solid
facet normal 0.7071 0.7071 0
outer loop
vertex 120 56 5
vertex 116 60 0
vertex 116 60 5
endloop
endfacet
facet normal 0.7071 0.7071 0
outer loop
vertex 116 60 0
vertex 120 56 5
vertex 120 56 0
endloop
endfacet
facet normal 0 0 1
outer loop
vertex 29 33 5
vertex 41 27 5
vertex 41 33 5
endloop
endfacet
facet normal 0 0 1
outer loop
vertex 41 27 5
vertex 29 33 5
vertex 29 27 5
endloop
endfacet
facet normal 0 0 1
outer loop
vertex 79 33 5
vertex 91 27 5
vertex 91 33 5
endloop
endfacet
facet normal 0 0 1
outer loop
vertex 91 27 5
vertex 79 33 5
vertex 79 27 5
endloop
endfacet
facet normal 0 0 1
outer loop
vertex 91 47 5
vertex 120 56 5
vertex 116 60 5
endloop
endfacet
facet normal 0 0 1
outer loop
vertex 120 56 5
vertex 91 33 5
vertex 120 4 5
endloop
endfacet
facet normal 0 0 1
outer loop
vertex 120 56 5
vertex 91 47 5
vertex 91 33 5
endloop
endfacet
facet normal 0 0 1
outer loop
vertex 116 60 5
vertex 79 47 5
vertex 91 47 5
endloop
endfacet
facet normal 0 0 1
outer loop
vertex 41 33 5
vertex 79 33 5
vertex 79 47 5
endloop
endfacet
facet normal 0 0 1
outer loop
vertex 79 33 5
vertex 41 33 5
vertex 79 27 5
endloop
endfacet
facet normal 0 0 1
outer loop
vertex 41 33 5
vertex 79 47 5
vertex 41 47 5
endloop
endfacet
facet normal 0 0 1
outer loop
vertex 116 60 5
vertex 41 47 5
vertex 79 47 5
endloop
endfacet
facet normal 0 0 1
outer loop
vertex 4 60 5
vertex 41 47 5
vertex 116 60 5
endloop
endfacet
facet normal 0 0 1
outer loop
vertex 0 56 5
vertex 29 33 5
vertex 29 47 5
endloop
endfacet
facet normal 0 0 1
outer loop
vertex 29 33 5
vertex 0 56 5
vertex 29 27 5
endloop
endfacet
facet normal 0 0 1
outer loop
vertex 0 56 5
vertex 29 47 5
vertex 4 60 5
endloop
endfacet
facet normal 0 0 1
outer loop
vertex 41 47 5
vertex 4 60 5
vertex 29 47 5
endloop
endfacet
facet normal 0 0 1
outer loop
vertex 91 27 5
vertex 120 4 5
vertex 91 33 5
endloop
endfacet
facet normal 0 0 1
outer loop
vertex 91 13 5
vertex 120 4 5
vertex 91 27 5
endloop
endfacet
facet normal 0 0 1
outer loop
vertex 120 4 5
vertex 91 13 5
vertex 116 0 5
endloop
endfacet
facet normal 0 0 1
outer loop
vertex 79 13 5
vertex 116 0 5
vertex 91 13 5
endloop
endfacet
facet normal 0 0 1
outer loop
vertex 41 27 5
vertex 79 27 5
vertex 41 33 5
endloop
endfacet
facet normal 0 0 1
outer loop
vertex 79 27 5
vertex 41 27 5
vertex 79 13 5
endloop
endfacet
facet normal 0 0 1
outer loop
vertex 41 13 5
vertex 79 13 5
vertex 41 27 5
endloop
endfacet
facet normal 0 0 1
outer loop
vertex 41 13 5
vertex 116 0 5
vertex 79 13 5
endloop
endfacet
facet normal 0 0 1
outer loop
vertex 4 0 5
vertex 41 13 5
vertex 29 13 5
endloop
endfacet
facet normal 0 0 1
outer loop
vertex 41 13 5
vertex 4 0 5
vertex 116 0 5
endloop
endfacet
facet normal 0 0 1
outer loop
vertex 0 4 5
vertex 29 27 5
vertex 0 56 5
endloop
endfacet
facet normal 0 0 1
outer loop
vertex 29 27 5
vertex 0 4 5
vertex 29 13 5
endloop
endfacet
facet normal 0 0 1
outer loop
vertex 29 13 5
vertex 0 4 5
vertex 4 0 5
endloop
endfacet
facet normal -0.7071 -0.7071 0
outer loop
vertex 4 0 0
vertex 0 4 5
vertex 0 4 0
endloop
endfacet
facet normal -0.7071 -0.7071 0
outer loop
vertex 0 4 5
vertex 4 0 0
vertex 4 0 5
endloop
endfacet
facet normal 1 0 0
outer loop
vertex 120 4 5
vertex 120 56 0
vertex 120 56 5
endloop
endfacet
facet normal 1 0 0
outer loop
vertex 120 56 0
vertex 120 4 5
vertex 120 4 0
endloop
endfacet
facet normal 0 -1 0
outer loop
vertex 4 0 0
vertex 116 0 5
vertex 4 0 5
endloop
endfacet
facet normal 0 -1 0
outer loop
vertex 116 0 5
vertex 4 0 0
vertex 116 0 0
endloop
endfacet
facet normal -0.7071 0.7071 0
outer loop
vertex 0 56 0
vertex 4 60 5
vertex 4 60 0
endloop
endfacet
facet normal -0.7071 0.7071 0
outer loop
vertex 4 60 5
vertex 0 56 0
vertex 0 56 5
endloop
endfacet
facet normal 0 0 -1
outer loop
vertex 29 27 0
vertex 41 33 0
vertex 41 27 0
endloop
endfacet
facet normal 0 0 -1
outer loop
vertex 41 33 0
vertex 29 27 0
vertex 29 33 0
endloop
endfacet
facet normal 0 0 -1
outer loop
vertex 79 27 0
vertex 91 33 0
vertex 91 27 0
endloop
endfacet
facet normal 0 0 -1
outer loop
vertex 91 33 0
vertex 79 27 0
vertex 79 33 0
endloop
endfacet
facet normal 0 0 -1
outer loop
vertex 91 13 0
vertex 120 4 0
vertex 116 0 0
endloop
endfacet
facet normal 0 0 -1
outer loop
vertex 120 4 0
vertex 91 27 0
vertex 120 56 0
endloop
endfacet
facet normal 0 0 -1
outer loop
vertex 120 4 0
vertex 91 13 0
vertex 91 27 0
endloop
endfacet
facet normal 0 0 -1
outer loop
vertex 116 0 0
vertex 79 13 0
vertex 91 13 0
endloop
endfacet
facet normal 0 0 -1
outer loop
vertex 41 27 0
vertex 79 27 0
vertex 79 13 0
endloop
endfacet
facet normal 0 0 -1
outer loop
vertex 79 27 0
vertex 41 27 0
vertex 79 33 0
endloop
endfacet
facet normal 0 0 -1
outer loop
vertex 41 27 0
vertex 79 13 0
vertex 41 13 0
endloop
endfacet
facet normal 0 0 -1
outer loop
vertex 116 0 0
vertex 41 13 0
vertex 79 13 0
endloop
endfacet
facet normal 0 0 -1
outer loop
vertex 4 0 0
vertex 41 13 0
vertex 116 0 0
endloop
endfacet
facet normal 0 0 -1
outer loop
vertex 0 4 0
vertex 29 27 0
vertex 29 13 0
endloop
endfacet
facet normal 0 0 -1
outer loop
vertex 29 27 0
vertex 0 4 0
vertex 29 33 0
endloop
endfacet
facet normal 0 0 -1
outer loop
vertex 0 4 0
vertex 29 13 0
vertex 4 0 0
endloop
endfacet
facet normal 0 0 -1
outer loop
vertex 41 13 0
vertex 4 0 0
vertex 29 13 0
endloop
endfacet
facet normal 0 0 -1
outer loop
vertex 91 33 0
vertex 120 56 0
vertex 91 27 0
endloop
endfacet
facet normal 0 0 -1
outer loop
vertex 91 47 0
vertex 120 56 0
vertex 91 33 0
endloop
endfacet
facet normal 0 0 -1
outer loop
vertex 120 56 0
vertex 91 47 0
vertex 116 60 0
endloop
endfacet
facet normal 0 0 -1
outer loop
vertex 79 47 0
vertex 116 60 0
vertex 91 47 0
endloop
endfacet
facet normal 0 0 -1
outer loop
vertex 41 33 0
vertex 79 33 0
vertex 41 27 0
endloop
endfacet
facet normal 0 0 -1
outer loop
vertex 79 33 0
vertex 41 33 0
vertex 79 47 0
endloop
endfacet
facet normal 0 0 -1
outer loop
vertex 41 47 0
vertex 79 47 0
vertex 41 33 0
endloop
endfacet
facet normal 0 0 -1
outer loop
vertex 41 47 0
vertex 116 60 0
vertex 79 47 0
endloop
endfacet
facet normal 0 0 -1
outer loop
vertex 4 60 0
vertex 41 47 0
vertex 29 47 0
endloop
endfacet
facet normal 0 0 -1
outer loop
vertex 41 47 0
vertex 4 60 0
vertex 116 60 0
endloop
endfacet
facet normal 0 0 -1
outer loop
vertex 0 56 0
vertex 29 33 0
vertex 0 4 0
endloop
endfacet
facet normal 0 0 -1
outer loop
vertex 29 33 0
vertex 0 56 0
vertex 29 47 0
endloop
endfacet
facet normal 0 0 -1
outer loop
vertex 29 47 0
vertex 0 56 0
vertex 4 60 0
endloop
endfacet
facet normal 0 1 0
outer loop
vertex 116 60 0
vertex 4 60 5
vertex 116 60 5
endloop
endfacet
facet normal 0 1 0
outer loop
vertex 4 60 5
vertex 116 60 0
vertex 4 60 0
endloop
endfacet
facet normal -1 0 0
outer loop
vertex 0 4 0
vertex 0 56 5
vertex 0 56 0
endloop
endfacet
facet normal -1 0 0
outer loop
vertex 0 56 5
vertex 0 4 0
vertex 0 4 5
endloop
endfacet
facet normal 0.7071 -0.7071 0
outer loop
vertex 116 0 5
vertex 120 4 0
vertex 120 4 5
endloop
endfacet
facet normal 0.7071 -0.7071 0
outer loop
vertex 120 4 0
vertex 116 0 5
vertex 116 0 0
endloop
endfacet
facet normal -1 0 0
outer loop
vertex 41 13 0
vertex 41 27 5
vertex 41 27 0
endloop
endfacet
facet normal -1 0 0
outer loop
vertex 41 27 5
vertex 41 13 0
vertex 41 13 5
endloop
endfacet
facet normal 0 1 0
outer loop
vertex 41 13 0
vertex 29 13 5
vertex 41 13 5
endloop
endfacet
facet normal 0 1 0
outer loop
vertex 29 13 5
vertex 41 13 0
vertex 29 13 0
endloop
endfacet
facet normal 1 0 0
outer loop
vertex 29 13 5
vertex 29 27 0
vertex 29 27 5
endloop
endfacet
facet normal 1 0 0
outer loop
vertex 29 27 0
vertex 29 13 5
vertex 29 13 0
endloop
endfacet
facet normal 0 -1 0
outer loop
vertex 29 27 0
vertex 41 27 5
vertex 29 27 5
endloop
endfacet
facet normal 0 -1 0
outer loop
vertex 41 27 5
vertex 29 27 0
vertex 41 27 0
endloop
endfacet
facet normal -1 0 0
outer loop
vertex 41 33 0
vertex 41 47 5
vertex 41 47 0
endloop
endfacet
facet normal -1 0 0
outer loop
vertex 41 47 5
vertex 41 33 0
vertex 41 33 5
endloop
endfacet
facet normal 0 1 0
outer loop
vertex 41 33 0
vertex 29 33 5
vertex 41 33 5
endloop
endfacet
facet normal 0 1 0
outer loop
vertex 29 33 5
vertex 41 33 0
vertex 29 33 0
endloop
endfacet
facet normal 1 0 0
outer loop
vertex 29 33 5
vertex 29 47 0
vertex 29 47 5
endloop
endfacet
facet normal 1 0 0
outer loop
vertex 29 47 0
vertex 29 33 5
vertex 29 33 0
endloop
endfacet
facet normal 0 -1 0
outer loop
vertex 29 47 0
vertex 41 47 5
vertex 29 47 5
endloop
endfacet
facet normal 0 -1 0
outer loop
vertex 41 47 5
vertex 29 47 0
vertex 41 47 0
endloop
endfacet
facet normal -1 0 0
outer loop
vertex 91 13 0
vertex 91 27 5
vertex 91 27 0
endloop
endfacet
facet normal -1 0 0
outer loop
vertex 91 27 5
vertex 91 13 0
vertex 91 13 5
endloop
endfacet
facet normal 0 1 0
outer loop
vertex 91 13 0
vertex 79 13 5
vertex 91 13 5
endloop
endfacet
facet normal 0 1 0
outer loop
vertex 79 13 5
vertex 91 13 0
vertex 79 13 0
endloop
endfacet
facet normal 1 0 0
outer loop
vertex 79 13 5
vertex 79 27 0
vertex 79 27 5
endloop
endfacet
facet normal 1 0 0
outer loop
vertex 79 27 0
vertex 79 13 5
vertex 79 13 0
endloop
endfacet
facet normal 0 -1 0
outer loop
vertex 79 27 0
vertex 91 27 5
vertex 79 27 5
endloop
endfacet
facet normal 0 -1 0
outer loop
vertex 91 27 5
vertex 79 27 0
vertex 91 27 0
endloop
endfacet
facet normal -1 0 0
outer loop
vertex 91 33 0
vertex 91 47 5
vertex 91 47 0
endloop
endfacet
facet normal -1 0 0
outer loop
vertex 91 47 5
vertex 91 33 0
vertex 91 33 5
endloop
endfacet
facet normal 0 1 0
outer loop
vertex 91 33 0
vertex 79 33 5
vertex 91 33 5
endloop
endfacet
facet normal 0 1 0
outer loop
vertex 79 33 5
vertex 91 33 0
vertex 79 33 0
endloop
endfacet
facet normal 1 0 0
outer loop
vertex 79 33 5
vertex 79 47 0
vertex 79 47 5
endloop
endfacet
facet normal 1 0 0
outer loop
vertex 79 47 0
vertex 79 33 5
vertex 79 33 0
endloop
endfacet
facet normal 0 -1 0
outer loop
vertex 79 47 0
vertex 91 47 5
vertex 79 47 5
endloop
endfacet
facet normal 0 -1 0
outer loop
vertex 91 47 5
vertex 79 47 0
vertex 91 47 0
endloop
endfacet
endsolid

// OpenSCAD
$fn = 32;

// ----------------------------------------------------------------------
// Windowed plate: 4 voids, 120 x 60 x 5 mm
// ----------------------------------------------------------------------

// --- parameters (mm) ---
plate_l = 120;            // plate length, X
plate_w = 60;             // plate width, Y
plate_t = 5;              // plate thickness, Z
edge_margin = 10;         // wall from the plate edge to any window
win_l = 12;               // pocket length
win_w = 14;               // pocket width
pitch_x = 50;             // grid pitch along X
pitch_y = 20;             // grid pitch along Y
depth_1 = 5;              // depth of void 1 (full thickness = through)
depth_2 = 5;              // depth of void 2 (full thickness = through)
depth_3 = 5;              // depth of void 3 (full thickness = through)
depth_4 = 5;              // depth of void 4 (full thickness = through)
corner_c = 4;             // corner chamfer of the plate

profile = [[4, 0], [116, 0], [120, 4], [120, 56], [116, 60], [4, 60], [0, 56], [0, 4]];  // primary outline, 8 points, counter clockwise
void_1 = [[29, 13], [41, 13], [41, 27], [29, 27]];  // pocket at grid node 0,0, 4 points
void_2 = [[29, 33], [41, 33], [41, 47], [29, 47]];  // pocket at grid node 0,1, 4 points
void_3 = [[79, 13], [91, 13], [91, 27], [79, 27]];  // pocket at grid node 1,0, 4 points
void_4 = [[79, 33], [91, 33], [91, 47], [79, 47]];  // pocket at grid node 1,1, 4 points

// --- the one profile operation ---
difference() {
  linear_extrude(height = plate_t) polygon(points = profile);
  translate([0, 0, -1])
    linear_extrude(height = plate_t + 2) polygon(points = void_1);
  translate([0, 0, -1])
    linear_extrude(height = plate_t + 2) polygon(points = void_2);
  translate([0, 0, -1])
    linear_extrude(height = plate_t + 2) polygon(points = void_3);
  translate([0, 0, -1])
    linear_extrude(height = plate_t + 2) polygon(points = void_4);
}
